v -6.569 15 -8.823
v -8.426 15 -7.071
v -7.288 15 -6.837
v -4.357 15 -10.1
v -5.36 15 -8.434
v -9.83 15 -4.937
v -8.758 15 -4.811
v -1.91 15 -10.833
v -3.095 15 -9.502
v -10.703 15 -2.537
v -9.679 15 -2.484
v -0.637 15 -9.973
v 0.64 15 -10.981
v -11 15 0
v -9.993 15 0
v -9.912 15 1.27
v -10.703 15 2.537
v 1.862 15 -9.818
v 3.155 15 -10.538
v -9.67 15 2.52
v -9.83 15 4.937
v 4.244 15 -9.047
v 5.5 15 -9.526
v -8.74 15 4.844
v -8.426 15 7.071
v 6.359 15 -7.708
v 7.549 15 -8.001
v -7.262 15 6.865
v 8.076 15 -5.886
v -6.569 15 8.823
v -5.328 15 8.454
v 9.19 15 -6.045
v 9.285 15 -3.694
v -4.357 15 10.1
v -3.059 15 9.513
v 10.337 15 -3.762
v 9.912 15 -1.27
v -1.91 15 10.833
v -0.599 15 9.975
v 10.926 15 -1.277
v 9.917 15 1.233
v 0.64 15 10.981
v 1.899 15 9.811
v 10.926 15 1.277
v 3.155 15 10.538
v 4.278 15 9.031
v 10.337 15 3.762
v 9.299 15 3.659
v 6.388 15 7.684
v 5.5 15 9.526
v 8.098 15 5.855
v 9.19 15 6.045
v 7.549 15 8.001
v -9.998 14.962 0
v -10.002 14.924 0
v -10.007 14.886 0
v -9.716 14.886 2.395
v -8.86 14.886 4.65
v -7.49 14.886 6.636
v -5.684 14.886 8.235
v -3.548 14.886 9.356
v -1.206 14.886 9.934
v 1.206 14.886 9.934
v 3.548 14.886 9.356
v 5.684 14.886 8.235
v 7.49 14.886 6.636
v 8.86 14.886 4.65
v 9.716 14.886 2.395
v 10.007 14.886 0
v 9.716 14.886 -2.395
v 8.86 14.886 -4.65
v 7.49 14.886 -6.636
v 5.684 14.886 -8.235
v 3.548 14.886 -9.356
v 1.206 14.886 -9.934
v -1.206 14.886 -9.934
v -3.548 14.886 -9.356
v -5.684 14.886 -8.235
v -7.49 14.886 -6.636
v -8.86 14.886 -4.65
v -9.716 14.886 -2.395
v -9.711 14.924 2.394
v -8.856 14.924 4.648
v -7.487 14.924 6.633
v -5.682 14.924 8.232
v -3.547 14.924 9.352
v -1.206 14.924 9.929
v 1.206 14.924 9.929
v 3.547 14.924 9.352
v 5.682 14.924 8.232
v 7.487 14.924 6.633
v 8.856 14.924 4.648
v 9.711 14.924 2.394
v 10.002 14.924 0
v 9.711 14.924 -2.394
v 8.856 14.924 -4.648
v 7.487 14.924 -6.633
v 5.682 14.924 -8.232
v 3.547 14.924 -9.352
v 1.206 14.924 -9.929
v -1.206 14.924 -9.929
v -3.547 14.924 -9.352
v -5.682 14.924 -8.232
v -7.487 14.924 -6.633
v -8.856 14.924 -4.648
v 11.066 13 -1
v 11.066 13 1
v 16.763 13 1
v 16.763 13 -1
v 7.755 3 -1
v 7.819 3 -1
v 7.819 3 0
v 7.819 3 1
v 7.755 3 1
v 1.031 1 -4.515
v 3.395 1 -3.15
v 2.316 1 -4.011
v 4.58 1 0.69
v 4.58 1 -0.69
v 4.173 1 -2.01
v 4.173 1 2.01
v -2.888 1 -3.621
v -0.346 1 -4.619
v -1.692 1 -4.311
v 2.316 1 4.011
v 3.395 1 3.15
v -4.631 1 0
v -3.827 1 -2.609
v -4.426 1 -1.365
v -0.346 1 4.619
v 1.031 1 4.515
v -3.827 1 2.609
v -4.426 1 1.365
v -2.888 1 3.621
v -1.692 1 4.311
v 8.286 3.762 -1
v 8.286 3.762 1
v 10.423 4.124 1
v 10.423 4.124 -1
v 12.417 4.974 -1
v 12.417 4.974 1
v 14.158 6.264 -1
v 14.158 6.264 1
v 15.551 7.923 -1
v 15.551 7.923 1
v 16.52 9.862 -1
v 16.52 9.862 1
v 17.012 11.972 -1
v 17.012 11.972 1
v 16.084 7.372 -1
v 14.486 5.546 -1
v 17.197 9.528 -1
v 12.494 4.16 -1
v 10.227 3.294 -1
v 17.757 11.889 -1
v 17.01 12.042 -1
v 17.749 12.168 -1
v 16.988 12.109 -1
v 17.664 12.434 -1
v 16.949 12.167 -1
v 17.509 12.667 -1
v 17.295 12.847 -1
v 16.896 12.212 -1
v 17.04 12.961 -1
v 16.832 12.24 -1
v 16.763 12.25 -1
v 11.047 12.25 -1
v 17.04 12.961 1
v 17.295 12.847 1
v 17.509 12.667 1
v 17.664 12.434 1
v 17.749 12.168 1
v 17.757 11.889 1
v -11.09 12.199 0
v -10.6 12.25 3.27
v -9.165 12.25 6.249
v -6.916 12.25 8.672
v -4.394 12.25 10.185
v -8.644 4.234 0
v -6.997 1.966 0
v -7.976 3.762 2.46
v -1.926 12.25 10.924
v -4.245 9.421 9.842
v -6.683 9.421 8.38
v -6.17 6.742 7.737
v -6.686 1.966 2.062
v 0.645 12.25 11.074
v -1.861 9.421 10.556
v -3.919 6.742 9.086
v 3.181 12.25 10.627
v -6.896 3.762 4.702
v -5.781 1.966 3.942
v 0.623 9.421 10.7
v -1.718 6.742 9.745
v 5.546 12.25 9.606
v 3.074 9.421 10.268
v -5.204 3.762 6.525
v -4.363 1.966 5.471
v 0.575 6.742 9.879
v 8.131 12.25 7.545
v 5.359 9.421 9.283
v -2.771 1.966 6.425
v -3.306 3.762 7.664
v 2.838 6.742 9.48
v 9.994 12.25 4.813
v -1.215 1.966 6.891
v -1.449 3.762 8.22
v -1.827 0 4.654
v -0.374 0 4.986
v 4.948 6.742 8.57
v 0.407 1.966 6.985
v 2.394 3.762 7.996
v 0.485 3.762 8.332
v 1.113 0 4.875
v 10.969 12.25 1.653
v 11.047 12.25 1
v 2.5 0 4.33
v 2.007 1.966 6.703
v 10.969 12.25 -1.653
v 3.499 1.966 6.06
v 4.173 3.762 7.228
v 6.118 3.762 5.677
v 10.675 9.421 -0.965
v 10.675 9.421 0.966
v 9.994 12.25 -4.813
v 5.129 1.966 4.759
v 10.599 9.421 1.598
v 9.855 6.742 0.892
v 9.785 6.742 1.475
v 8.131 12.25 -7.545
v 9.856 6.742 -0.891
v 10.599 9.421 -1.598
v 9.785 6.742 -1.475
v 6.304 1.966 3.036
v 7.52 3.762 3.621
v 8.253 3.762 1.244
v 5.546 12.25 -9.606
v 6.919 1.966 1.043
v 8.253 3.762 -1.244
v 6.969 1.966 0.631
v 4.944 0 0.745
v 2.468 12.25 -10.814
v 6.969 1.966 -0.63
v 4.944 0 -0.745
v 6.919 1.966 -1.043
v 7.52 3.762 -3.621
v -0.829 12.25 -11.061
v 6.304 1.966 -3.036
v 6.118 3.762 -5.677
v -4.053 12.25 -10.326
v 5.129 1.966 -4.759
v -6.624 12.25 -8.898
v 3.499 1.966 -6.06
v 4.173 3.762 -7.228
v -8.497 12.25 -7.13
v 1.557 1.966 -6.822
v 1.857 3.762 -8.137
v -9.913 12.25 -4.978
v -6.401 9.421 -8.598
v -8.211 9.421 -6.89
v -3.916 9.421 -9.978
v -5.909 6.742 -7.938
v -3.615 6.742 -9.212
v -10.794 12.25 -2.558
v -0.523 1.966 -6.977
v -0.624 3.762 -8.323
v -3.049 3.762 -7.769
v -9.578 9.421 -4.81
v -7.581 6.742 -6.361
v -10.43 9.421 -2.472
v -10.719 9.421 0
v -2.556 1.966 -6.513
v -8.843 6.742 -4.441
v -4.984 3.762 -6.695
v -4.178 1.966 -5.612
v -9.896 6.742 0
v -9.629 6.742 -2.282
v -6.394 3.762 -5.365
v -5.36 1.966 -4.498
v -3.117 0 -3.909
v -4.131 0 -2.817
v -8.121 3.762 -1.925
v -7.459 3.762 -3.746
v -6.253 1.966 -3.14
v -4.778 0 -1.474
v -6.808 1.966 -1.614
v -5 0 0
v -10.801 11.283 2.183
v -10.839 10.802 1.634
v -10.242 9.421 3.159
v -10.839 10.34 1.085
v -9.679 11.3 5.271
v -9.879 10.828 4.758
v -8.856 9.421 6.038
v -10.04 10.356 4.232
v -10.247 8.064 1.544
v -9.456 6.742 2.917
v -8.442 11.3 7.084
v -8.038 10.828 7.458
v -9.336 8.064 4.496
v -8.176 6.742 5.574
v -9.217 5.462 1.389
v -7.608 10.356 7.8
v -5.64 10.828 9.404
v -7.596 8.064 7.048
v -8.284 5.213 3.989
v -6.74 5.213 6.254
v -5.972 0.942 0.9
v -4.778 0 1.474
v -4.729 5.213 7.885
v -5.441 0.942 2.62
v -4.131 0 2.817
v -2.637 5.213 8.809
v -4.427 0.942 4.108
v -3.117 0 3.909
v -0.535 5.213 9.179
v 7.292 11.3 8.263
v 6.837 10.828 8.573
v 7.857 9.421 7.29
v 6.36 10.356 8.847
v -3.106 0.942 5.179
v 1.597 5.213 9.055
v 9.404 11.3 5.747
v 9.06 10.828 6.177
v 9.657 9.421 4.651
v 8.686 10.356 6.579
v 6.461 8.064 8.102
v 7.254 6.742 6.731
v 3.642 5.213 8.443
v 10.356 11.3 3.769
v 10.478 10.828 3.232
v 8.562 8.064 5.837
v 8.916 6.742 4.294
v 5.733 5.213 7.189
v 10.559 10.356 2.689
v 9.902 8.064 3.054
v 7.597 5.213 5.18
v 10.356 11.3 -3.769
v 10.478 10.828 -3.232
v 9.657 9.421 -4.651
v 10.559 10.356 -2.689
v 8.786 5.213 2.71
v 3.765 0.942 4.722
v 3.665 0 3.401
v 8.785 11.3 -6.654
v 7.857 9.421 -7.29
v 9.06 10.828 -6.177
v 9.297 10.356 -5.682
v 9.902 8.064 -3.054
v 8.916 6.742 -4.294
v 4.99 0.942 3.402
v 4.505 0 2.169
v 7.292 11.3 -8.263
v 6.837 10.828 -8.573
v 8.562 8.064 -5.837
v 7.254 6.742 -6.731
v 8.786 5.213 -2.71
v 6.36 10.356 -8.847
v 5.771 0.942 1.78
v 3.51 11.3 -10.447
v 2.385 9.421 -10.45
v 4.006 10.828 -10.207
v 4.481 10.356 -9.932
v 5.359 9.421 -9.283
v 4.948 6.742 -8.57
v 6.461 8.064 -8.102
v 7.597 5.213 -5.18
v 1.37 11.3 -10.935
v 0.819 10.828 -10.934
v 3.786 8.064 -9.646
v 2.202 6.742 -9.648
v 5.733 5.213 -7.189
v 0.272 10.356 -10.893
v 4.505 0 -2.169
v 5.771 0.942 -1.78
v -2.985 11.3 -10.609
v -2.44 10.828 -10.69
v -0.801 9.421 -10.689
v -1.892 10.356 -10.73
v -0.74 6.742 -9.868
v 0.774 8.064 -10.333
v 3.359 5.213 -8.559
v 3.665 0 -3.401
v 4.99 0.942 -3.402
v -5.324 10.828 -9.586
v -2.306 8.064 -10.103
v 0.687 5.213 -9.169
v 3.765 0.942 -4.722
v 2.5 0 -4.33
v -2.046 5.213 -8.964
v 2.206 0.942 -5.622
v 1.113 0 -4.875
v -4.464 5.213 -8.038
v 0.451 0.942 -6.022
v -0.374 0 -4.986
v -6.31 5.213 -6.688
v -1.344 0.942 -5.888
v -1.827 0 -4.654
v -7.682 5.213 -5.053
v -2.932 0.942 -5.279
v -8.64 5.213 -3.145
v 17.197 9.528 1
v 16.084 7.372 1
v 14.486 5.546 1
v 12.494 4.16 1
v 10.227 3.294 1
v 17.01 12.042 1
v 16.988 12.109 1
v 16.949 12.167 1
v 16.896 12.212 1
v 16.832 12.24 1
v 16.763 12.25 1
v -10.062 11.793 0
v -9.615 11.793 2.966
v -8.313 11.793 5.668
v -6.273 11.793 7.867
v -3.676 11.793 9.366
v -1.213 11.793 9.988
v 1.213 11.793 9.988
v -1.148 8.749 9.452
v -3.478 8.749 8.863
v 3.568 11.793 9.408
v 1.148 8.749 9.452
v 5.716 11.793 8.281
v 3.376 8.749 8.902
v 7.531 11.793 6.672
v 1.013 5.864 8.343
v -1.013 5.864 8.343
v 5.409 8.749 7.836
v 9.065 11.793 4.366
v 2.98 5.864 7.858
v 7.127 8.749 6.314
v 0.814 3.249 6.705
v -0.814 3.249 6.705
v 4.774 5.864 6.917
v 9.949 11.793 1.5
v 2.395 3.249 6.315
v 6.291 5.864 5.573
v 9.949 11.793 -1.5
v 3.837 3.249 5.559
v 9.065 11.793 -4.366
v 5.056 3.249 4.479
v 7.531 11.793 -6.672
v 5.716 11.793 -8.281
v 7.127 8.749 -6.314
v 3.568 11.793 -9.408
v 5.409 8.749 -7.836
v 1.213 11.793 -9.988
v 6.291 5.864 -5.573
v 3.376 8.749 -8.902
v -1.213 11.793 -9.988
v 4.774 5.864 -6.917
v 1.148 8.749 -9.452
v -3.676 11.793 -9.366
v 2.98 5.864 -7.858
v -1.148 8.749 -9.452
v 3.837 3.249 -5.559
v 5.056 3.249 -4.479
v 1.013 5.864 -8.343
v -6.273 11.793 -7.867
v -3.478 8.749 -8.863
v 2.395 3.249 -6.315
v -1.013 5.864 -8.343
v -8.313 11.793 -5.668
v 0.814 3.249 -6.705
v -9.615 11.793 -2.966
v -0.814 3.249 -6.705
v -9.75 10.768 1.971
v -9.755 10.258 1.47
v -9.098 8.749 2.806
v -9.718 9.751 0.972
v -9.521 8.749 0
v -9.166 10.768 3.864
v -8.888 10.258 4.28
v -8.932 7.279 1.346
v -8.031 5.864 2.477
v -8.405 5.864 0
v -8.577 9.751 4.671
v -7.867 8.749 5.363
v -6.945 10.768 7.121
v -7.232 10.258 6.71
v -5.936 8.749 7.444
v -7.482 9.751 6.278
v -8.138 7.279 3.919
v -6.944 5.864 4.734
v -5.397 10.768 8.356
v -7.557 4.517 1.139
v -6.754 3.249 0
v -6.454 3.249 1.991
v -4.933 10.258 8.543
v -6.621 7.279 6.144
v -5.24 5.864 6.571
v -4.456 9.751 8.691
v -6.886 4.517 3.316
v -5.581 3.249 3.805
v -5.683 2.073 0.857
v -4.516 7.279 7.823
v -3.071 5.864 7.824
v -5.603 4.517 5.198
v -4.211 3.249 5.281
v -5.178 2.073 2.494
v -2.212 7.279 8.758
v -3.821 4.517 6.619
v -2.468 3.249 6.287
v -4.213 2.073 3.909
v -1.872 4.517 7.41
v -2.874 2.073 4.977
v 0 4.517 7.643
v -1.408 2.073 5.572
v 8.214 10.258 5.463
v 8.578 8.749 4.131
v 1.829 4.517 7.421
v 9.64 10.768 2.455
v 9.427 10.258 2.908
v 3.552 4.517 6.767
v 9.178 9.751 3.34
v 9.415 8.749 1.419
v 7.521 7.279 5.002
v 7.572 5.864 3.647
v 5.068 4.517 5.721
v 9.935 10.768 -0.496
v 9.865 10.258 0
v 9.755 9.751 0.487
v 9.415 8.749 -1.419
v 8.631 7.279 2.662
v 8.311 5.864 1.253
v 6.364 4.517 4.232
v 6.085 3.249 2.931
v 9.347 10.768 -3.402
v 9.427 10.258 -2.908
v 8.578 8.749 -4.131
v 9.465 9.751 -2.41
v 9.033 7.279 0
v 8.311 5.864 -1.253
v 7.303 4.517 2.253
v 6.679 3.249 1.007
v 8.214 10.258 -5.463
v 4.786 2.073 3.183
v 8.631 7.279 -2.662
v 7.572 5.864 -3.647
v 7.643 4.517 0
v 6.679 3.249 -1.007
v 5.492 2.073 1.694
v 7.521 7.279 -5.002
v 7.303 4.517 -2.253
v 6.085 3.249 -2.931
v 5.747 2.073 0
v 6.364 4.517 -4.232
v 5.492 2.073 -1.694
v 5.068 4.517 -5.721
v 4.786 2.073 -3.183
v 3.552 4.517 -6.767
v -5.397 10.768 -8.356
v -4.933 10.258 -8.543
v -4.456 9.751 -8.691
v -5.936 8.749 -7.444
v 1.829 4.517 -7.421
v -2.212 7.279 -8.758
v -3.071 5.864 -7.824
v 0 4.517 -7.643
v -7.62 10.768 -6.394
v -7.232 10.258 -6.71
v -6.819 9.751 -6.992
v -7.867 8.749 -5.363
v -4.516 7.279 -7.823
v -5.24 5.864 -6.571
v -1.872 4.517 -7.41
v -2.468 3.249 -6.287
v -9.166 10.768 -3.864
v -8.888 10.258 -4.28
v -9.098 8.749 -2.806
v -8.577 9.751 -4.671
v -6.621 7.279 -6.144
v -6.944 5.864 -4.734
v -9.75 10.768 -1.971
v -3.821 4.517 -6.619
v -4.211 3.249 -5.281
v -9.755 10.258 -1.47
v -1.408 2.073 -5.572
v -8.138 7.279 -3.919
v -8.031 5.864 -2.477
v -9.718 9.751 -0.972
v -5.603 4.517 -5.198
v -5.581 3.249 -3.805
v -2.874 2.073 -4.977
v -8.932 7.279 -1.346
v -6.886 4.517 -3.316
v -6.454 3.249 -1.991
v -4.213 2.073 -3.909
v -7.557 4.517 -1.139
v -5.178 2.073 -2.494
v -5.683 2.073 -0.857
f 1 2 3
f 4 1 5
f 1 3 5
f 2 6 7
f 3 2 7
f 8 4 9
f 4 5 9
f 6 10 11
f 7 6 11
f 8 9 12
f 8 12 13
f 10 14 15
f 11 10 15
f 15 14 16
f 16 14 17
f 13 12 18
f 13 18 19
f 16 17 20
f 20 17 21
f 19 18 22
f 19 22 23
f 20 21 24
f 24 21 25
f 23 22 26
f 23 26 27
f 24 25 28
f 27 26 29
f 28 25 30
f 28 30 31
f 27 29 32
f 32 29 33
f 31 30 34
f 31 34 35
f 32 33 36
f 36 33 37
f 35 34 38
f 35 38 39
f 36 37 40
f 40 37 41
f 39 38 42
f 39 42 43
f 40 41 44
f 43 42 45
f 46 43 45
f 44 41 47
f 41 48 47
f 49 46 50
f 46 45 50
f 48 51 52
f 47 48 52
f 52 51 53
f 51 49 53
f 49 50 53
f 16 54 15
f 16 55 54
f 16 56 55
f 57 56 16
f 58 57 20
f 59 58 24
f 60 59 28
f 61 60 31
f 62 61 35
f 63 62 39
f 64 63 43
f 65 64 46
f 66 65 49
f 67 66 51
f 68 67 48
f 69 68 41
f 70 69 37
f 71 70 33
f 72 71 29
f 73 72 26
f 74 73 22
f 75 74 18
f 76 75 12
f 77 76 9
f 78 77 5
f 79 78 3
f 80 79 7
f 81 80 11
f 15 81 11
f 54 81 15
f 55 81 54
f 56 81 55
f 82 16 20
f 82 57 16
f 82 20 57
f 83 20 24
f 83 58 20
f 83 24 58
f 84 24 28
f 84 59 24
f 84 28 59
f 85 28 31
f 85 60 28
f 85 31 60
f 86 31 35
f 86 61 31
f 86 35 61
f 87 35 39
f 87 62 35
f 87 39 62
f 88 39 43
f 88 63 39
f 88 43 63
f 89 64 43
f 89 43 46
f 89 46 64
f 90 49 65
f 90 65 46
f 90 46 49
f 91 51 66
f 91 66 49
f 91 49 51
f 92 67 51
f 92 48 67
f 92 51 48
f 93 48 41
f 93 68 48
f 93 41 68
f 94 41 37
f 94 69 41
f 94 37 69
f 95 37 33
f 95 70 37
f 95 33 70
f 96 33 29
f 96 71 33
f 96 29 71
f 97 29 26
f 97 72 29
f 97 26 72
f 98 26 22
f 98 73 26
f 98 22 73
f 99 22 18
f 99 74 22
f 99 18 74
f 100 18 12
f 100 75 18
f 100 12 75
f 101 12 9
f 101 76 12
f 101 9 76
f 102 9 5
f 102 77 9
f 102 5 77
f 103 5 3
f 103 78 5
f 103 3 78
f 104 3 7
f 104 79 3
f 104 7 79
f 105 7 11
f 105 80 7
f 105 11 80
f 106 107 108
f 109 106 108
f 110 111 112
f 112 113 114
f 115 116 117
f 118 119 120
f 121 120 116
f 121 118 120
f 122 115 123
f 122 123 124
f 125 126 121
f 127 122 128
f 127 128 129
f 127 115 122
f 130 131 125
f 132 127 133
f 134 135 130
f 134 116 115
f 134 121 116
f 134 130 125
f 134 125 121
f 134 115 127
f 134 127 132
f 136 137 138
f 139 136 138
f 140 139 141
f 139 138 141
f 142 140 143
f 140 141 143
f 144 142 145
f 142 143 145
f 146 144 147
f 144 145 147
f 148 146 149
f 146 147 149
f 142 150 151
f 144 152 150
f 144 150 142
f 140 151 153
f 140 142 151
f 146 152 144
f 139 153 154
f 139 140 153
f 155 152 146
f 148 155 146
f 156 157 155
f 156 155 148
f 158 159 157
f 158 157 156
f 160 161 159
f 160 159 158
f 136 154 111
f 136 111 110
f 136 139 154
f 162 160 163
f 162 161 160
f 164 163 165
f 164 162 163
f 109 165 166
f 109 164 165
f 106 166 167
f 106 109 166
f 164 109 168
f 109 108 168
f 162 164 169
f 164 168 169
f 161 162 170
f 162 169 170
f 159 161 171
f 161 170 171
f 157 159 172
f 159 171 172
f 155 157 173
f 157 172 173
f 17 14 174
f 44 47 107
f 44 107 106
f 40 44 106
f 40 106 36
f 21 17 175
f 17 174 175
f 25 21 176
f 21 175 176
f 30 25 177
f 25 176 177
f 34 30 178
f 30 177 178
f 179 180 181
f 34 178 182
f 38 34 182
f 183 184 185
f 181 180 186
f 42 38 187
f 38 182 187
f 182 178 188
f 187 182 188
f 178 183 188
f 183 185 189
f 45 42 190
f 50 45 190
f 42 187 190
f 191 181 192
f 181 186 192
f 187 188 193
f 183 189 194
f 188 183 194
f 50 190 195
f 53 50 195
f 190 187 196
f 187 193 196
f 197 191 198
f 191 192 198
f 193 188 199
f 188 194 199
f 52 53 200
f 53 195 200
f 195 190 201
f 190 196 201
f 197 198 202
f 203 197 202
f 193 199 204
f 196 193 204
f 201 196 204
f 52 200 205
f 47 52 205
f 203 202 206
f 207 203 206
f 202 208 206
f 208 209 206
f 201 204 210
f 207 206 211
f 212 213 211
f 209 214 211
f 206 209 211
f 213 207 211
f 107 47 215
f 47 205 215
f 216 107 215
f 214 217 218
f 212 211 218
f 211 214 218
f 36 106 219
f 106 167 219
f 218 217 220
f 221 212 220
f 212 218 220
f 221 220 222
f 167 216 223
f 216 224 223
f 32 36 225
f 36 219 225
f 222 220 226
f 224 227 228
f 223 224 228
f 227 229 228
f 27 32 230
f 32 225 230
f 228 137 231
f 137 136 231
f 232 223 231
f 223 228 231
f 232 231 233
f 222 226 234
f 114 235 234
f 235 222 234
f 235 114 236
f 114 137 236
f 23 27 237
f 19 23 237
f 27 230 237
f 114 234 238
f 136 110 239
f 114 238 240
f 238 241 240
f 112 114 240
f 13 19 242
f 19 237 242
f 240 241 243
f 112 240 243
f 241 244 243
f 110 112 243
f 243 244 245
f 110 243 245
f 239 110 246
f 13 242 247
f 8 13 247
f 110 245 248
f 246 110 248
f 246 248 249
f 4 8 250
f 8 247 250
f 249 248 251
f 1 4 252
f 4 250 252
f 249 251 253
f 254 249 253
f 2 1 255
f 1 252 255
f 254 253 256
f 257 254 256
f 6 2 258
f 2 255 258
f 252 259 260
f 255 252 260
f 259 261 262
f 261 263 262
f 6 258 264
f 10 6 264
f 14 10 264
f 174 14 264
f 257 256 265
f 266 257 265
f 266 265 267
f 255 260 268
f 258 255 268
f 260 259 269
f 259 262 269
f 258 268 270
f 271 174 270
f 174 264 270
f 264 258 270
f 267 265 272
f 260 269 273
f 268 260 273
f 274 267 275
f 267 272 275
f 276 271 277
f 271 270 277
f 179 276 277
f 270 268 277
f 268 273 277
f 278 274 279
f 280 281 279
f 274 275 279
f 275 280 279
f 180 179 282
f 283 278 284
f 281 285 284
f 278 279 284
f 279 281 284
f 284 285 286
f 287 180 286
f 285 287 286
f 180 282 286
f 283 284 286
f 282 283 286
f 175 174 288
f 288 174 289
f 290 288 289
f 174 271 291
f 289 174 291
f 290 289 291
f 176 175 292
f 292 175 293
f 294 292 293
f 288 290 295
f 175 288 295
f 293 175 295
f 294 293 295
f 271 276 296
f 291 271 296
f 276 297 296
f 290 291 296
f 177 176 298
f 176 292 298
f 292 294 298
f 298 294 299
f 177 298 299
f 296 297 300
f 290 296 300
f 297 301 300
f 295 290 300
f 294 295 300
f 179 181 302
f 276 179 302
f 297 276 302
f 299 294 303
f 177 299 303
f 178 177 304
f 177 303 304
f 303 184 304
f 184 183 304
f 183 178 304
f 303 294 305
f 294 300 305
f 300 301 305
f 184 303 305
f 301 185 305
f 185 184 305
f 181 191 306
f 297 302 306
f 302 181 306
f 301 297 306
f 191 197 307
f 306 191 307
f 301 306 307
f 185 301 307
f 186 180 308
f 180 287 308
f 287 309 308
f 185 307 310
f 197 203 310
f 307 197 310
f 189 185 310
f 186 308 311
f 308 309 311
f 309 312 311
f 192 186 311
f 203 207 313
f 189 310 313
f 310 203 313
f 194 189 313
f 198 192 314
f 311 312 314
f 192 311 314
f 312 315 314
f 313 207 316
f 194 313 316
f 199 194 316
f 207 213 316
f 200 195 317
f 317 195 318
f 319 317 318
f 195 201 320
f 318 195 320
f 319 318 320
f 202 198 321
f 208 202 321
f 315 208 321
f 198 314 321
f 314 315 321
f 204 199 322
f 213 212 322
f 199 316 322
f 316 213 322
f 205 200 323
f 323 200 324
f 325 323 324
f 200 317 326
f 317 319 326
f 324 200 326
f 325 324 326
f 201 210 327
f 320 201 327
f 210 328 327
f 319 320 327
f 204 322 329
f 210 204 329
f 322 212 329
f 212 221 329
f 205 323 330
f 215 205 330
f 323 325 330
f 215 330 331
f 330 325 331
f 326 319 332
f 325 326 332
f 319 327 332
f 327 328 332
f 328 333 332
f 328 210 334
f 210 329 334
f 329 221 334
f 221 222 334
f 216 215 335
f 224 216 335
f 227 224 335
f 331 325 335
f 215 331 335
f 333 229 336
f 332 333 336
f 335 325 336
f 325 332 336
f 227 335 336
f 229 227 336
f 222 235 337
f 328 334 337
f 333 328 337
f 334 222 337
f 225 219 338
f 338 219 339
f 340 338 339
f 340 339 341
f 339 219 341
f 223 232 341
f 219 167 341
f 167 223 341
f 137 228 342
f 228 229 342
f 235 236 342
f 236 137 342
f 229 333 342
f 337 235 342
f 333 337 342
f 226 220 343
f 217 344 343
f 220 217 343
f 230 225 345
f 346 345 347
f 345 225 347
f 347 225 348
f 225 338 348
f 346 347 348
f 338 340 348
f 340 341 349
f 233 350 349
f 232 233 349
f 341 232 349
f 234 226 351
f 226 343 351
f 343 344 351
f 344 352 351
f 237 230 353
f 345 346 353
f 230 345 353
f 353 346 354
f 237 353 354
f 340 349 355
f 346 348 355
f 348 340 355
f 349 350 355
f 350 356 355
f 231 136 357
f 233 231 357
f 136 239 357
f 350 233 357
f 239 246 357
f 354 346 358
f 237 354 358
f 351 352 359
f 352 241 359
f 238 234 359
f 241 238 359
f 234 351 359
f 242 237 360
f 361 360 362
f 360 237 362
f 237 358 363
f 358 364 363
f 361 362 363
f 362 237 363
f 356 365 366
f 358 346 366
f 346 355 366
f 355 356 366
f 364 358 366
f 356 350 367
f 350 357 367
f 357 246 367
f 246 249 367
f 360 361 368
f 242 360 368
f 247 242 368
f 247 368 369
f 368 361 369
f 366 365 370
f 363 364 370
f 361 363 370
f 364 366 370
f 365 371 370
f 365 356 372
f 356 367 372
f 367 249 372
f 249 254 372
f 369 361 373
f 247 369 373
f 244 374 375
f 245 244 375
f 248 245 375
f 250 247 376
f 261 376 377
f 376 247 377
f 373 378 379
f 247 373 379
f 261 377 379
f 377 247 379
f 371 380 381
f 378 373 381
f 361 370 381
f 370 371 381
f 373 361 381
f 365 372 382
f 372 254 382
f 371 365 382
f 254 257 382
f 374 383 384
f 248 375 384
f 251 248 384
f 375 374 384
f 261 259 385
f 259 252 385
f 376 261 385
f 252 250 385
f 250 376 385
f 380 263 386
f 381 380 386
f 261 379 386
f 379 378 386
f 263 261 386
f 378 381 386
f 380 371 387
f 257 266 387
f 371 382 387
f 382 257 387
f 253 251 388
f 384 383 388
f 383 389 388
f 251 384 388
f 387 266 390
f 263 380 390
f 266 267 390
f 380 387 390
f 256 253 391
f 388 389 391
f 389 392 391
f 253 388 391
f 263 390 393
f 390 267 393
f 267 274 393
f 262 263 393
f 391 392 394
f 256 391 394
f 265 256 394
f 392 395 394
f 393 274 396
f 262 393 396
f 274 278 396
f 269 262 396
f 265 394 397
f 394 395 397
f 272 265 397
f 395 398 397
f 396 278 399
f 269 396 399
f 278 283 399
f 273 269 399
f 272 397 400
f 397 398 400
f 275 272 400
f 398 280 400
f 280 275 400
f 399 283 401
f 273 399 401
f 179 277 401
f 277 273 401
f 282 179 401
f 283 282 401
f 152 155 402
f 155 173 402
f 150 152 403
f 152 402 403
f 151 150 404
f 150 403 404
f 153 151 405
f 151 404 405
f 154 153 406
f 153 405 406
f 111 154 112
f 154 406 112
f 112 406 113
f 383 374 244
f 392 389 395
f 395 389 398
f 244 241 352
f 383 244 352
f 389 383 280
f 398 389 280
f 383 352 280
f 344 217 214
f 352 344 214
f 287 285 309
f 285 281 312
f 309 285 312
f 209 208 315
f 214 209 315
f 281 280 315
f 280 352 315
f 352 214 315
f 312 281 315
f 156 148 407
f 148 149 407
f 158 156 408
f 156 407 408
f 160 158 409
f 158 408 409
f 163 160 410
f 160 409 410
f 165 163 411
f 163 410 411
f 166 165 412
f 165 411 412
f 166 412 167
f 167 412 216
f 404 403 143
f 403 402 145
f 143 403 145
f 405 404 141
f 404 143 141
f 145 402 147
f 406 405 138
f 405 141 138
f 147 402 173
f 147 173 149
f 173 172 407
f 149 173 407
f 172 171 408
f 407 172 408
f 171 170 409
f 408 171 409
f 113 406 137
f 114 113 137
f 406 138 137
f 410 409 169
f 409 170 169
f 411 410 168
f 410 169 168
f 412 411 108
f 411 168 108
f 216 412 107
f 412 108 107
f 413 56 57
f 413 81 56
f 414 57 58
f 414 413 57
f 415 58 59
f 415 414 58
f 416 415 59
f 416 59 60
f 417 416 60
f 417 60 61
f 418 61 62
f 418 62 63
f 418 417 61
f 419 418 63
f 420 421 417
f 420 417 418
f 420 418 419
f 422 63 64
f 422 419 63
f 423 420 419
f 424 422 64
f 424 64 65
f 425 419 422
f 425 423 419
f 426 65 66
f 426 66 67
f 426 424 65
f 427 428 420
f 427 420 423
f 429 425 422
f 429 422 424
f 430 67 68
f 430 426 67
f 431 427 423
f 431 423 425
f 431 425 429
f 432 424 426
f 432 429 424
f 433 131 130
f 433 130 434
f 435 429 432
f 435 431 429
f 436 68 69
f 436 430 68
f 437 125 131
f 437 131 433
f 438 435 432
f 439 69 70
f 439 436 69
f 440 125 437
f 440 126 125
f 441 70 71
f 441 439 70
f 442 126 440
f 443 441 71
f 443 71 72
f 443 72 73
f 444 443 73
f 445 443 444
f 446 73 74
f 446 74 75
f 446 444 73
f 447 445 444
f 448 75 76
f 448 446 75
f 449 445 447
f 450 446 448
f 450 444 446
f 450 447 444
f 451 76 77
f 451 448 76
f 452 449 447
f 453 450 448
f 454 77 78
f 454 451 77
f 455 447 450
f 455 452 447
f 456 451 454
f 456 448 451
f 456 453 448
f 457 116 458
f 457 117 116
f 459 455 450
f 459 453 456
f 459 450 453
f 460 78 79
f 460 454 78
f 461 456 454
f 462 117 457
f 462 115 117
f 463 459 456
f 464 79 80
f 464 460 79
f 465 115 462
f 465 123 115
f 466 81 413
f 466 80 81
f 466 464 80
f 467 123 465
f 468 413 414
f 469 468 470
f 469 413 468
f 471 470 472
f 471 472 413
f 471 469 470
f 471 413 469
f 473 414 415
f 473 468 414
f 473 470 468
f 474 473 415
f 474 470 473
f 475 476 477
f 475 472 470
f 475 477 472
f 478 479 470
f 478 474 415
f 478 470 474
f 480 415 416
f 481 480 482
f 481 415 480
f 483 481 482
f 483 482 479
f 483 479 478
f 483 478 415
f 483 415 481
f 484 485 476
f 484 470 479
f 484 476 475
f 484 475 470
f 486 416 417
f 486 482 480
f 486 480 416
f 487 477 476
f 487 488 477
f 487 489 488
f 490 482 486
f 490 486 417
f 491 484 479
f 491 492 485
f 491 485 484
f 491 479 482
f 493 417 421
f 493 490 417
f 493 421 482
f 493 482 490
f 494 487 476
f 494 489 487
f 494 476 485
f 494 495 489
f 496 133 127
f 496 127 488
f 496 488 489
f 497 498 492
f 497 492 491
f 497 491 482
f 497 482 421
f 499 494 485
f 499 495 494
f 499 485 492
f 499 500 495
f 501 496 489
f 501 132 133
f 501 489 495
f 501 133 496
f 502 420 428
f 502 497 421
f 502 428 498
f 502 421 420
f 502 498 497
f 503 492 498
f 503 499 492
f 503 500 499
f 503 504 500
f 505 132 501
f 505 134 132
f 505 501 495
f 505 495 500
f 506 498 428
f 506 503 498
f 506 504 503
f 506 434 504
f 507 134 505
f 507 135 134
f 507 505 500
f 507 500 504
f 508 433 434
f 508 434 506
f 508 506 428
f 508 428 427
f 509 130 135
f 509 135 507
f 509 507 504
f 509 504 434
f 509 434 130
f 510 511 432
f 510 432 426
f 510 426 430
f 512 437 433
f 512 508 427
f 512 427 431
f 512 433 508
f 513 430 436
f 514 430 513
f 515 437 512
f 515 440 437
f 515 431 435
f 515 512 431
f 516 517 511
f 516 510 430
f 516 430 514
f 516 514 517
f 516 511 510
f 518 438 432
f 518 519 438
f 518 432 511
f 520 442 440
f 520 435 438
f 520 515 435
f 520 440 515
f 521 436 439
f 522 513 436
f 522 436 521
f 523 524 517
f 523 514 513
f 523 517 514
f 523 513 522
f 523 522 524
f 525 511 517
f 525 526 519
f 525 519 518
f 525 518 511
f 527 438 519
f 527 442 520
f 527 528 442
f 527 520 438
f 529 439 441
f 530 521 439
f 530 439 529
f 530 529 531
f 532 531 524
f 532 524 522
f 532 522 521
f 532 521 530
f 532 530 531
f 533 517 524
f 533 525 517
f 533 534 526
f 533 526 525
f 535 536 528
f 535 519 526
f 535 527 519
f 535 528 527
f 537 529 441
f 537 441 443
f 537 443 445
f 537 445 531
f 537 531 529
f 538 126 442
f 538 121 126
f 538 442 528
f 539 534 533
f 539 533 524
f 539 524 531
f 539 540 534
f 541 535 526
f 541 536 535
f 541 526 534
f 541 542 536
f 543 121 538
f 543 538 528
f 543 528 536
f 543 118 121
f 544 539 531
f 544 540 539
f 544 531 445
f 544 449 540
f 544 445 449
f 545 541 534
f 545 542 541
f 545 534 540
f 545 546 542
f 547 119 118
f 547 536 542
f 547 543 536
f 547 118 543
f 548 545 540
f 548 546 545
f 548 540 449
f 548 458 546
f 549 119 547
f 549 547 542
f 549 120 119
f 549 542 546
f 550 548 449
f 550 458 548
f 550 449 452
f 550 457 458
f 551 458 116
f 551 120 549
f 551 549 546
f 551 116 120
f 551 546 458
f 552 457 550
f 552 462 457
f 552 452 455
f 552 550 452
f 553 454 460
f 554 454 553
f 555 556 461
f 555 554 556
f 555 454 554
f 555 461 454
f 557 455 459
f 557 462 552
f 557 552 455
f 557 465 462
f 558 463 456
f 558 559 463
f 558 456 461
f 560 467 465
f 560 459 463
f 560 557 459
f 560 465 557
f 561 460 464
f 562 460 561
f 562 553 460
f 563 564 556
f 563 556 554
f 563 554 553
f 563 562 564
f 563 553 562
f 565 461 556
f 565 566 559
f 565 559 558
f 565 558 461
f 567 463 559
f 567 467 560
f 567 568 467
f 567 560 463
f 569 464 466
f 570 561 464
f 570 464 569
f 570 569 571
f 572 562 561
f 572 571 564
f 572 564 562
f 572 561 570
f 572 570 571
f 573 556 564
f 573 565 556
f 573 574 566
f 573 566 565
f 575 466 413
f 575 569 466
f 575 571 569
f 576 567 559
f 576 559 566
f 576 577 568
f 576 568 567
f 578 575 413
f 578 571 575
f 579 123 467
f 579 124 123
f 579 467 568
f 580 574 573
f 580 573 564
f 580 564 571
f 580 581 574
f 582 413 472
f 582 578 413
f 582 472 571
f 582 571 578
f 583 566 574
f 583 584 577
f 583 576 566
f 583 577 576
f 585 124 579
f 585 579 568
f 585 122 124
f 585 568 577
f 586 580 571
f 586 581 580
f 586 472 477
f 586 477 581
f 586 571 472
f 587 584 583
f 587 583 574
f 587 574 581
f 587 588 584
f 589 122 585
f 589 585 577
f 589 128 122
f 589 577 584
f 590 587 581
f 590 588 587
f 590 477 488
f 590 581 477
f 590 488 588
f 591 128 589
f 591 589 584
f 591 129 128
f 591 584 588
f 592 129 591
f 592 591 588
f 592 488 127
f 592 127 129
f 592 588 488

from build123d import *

# Parameters (mm, degrees)
EXTRUDE_THIN1_DEPTH = 1


with BuildPart() as part:
    # Sketch1 → Revolve1 (revolve)
    with BuildSketch(Plane.XY):
        with BuildLine():
            Line((0, 0), (0, 15))
            Line((0, 15), (-11, 15))
            ThreePointArc((-11, 15), (-9.895693792, 6.741722483), (-5, 0))
            Line((-5, 0), (0, 0))
        make_face()
    revolve(axis=Axis((0, 0, 0), (0, 1, 0)))

    # Sketch2 → Cut-Revolve1 (revolve, cut)
    with BuildSketch(Plane.XY):
        with BuildLine():
            Line((-4.631485449, 1), (0, 1))
            Line((0, 1), (0, 15))
            Line((0, 15), (-9.990391357, 15.020985748))
            ThreePointArc((-9.990391357, 15.020985748), (-9.998621935, 14.953314924), (-10.00656412, 14.885609646))
            ThreePointArc((-10.00656412, 14.885609646), (-9.032678183, 7.279454631), (-4.631485449, 1))
        make_face()
    revolve(axis=Axis((0, 0, 0), (0, 1, 0)), mode=Mode.SUBTRACT)

    # Sketch4 → Extrude-Thin1 (add, symmetric)
    with BuildSketch(Plane.XY):
        with BuildLine():
            Line((10.5, 13), (16.763146706, 13))
            ThreePointArc((16.763146706, 13), (17.508502699, 12.666666667), (17.756954696, 11.888888889))
            ThreePointArc((17.756954696, 11.888888889), (14.485541463, 5.546440075), (7.818874796, 3))
            Line((7.818874796, 3), (7.314252508, 3))
            Line((7.314252508, 3), (7.314252508, 3.75))
            Line((7.314252508, 3.75), (7.818874796, 3.75))
            ThreePointArc((7.818874796, 3.75), (13.985541463, 6.105457069), (17.011598704, 11.972222222))
            ThreePointArc((17.011598704, 11.972222222), (16.949485704, 12.166666667), (16.763146706, 12.25))
            Line((16.763146706, 12.25), (10.5, 12.25))
            Line((10.5, 12.25), (10.5, 13))
        make_face()
    extrude(amount=EXTRUDE_THIN1_DEPTH, both=True)


solid = part.part
